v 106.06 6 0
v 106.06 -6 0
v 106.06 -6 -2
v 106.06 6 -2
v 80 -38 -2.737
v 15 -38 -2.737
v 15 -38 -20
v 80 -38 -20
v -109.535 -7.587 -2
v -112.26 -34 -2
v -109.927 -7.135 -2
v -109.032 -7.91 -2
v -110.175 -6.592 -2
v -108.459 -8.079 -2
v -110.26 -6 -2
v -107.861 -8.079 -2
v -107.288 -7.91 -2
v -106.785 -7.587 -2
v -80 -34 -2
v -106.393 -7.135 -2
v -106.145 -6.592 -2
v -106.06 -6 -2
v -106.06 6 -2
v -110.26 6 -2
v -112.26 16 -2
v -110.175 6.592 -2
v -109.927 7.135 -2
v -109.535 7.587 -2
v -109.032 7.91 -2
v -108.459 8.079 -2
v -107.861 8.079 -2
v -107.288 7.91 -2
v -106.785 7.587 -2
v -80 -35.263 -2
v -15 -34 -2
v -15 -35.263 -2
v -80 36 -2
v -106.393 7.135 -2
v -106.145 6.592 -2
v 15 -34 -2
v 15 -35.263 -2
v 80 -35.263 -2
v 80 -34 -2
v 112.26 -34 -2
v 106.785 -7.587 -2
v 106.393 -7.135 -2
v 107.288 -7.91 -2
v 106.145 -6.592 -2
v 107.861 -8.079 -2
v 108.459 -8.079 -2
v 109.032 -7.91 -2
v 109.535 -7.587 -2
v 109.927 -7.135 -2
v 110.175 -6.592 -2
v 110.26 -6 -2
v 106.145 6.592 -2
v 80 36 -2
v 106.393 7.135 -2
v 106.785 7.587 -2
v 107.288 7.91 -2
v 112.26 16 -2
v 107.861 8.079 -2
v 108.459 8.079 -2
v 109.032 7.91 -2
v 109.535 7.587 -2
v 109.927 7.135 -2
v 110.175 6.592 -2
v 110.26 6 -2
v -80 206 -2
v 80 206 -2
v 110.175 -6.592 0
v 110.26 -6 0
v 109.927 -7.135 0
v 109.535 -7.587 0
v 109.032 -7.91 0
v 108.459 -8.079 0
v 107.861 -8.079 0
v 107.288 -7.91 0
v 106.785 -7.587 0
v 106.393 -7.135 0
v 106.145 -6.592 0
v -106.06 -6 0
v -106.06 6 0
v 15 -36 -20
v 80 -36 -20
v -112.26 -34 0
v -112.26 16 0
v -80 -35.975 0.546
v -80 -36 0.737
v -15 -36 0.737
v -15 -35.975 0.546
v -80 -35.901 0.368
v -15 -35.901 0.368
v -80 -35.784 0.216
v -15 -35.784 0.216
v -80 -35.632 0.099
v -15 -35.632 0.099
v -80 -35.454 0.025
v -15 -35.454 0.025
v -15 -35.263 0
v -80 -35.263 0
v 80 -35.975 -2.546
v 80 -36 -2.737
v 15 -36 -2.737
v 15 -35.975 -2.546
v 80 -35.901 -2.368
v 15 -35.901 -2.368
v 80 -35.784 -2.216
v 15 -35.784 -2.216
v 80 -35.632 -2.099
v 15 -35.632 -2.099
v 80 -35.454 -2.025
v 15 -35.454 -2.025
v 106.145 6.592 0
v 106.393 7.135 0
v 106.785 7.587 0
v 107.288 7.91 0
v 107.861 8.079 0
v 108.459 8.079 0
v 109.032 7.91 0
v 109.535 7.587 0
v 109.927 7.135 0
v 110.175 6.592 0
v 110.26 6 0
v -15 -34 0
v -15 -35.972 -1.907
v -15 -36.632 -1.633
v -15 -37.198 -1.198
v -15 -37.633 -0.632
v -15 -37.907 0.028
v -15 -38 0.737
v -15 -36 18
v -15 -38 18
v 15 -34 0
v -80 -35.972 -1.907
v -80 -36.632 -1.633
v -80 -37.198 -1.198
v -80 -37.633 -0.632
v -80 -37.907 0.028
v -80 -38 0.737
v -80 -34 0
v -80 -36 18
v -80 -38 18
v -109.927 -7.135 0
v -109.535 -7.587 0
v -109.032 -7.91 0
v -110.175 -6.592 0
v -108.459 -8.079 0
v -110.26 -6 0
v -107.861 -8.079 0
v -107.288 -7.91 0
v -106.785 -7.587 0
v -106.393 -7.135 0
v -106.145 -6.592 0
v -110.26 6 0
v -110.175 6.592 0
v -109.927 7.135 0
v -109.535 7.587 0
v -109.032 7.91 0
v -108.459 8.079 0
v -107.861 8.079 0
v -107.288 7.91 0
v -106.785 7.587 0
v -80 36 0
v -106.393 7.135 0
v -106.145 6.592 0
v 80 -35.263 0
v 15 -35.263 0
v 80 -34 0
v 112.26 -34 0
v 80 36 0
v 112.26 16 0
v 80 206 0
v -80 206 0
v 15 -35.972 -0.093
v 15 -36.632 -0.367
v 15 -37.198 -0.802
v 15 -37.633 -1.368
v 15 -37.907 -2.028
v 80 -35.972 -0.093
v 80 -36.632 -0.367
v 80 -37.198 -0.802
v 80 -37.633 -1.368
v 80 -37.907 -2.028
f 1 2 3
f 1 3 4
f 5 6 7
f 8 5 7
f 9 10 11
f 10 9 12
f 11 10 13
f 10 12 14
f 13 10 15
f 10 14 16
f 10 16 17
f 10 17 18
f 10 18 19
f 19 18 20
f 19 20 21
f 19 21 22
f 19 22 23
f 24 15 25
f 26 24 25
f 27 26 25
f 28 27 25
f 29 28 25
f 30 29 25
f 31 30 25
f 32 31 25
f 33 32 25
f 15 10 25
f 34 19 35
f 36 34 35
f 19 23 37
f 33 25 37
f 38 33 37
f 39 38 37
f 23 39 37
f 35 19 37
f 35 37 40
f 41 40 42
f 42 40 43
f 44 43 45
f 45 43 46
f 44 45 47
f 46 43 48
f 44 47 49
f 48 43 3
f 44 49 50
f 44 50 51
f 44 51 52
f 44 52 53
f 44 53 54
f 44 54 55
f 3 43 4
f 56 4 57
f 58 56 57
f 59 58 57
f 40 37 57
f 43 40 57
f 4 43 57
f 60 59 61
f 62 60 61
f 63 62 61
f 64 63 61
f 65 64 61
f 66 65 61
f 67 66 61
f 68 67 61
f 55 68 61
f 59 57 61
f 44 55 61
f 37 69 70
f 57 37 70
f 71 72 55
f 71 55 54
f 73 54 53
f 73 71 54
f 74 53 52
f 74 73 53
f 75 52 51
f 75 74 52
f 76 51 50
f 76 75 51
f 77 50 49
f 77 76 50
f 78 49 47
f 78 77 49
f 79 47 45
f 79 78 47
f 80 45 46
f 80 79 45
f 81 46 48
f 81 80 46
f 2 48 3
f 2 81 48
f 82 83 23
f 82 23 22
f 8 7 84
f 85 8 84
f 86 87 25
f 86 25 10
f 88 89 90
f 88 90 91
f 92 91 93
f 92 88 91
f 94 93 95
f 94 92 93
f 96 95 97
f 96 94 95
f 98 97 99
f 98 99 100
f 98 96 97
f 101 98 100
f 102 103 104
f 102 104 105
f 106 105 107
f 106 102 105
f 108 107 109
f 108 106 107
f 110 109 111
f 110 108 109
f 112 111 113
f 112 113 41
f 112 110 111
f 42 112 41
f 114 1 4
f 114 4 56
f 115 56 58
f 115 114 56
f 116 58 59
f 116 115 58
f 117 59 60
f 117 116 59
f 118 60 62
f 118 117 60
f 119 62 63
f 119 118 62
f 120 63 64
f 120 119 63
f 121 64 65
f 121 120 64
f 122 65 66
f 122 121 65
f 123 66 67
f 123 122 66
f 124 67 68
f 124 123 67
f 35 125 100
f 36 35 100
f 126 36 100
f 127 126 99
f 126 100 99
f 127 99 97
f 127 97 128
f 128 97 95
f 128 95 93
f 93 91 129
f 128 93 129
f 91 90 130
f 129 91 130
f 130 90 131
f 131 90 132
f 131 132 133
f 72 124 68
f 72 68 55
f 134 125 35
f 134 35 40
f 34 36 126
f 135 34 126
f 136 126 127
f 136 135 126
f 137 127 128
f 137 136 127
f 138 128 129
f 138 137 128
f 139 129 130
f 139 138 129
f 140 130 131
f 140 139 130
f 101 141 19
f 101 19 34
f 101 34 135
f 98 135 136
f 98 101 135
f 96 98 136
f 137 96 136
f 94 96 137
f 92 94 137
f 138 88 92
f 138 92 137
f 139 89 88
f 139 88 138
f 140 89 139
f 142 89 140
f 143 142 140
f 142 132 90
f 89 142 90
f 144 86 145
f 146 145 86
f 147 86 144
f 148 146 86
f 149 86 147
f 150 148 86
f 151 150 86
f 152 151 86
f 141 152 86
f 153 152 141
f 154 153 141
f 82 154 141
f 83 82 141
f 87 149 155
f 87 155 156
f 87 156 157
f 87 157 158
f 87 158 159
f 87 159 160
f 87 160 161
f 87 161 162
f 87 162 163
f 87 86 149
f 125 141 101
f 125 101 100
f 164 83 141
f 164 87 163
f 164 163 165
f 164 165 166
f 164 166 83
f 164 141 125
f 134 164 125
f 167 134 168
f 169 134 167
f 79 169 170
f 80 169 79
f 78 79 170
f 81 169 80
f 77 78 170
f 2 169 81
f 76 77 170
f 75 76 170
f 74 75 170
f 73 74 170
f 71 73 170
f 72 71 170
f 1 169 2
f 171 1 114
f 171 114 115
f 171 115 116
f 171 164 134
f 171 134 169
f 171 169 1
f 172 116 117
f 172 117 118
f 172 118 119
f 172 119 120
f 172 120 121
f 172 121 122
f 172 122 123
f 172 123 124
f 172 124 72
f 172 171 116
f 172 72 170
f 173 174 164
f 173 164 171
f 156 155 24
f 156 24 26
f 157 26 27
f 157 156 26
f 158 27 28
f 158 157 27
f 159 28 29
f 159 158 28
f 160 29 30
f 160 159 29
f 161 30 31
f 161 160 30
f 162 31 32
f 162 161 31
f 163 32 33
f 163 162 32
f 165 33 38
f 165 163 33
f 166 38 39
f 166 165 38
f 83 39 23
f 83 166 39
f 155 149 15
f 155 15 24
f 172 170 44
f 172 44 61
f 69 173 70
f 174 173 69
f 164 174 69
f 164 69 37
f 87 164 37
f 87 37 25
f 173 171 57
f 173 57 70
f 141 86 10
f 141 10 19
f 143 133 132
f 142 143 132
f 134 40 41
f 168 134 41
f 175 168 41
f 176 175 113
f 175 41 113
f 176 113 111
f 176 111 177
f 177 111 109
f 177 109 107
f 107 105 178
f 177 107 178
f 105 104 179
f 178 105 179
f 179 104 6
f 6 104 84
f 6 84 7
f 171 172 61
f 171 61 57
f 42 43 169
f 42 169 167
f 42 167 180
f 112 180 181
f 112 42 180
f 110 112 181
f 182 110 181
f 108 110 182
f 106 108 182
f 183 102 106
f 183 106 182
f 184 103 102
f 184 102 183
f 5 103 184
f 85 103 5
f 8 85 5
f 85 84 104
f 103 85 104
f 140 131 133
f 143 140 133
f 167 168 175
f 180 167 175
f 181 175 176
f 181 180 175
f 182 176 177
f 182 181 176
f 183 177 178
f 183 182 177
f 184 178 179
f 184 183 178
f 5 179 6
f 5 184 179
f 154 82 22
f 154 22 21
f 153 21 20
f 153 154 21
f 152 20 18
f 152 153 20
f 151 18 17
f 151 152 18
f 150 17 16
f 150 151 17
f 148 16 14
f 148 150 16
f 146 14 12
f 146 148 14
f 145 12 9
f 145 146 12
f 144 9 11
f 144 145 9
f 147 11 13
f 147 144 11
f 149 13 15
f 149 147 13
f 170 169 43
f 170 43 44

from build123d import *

# Parameters (mm, degrees)
BASE_FLANGE1_DEPTH           = 2
EDGE_FLANGE1_STRIP_W         = 9.4732
EDGE_FLANGE1_STRIP_H         = 2
EDGE_FLANGE1_STRIP_CUT_DEPTH = 65
EDGE_FLANGE1_DEPTH           = 65
EDGE_FLANGE2_STRIP_W         = 9.4732
EDGE_FLANGE2_STRIP_H         = 2
EDGE_FLANGE2_STRIP_CUT_DEPTH = 65
EDGE_FLANGE2_DEPTH           = 65


# Sheet-metal steps are written as plain solids
with BuildPart() as part:
    # Sketch1 → Base-Flange1 (new body)
    with BuildSketch(Plane.XY):
        Polygon((-80, 206), (-80, 36), (-112.26, 16), (-112.26, -34), (-80, -34), (-80, -38), (-15, -38), (-15, -34), (15, -34), (15, -38), (80, -38), (80, -34), (112.26, -34), (112.26, 16), (80, 36), (80, 206), align=None)
        with BuildLine():
            Line((-110.26, -6), (-110.26, 6))
            ThreePointArc((-110.26, 6), (-108.16, 8.1), (-106.06, 6))
            Line((-106.06, 6), (-106.06, -6))
            ThreePointArc((-106.06, -6), (-108.16, -8.1), (-110.26, -6))
        make_face(mode=Mode.SUBTRACT)
        with BuildLine():
            Line((106.06, -6), (106.06, 6))
            ThreePointArc((106.06, 6), (108.16, 8.1), (110.26, 6))
            Line((110.26, 6), (110.26, -6))
            ThreePointArc((110.26, -6), (108.16, -8.1), (106.06, -6))
        make_face(mode=Mode.SUBTRACT)
    extrude(amount=-BASE_FLANGE1_DEPTH)

    # Edge-Flange1 strip (across the edge) → Edge-Flange1 strip cut (cut)
    with BuildSketch(Plane(origin=(-80, -38, 0), x_dir=(0, 1, 0), z_dir=(1, 0, 0))):
        with Locations((-2, -1)):
            Rectangle(EDGE_FLANGE1_STRIP_W, EDGE_FLANGE1_STRIP_H)
    extrude(amount=EDGE_FLANGE1_STRIP_CUT_DEPTH, mode=Mode.SUBTRACT)

    # Edge-Flange1 section (across the edge) → Edge-Flange1 (add)
    with BuildSketch(Plane(origin=(-80, -38, 0), x_dir=(0, 1, 0), z_dir=(1, 0, 0))):
        with BuildLine():
            Line((0, 0.7366), (0, 18))
            Line((0, 18), (2, 18))
            Line((2, 18), (2, 0.7366))
            ThreePointArc((2, 0.7366), (2.215745145, 0.215745145), (2.7366, 0))
            Line((2.7366, 0), (2.7366, -2))
            ThreePointArc((2.7366, -2), (0.801531583, -1.198468417), (0, 0.7366))
        make_face()
    extrude(amount=EDGE_FLANGE1_DEPTH)

    # Edge-Flange2 strip (across the edge) → Edge-Flange2 strip cut (cut)
    with BuildSketch(Plane(origin=(80, -38, -2), x_dir=(0, 1, 0), z_dir=(-1, 0, 0))):
        with Locations((-2, -1)):
            Rectangle(EDGE_FLANGE2_STRIP_W, EDGE_FLANGE2_STRIP_H)
    extrude(amount=EDGE_FLANGE2_STRIP_CUT_DEPTH, mode=Mode.SUBTRACT)

    # Edge-Flange2 section (across the edge) → Edge-Flange2 (add)
    with BuildSketch(Plane(origin=(80, -38, -2), x_dir=(0, 1, 0), z_dir=(-1, 0, 0))):
        with BuildLine():
            Line((0, 0.7366), (0, 18))
            Line((0, 18), (2, 18))
            Line((2, 18), (2, 0.7366))
            ThreePointArc((2, 0.7366), (2.215745145, 0.215745145), (2.7366, 0))
            Line((2.7366, 0), (2.7366, -2))
            ThreePointArc((2.7366, -2), (0.801531583, -1.198468417), (0, 0.7366))
        make_face()
    extrude(amount=EDGE_FLANGE2_DEPTH)


solid = part.part
